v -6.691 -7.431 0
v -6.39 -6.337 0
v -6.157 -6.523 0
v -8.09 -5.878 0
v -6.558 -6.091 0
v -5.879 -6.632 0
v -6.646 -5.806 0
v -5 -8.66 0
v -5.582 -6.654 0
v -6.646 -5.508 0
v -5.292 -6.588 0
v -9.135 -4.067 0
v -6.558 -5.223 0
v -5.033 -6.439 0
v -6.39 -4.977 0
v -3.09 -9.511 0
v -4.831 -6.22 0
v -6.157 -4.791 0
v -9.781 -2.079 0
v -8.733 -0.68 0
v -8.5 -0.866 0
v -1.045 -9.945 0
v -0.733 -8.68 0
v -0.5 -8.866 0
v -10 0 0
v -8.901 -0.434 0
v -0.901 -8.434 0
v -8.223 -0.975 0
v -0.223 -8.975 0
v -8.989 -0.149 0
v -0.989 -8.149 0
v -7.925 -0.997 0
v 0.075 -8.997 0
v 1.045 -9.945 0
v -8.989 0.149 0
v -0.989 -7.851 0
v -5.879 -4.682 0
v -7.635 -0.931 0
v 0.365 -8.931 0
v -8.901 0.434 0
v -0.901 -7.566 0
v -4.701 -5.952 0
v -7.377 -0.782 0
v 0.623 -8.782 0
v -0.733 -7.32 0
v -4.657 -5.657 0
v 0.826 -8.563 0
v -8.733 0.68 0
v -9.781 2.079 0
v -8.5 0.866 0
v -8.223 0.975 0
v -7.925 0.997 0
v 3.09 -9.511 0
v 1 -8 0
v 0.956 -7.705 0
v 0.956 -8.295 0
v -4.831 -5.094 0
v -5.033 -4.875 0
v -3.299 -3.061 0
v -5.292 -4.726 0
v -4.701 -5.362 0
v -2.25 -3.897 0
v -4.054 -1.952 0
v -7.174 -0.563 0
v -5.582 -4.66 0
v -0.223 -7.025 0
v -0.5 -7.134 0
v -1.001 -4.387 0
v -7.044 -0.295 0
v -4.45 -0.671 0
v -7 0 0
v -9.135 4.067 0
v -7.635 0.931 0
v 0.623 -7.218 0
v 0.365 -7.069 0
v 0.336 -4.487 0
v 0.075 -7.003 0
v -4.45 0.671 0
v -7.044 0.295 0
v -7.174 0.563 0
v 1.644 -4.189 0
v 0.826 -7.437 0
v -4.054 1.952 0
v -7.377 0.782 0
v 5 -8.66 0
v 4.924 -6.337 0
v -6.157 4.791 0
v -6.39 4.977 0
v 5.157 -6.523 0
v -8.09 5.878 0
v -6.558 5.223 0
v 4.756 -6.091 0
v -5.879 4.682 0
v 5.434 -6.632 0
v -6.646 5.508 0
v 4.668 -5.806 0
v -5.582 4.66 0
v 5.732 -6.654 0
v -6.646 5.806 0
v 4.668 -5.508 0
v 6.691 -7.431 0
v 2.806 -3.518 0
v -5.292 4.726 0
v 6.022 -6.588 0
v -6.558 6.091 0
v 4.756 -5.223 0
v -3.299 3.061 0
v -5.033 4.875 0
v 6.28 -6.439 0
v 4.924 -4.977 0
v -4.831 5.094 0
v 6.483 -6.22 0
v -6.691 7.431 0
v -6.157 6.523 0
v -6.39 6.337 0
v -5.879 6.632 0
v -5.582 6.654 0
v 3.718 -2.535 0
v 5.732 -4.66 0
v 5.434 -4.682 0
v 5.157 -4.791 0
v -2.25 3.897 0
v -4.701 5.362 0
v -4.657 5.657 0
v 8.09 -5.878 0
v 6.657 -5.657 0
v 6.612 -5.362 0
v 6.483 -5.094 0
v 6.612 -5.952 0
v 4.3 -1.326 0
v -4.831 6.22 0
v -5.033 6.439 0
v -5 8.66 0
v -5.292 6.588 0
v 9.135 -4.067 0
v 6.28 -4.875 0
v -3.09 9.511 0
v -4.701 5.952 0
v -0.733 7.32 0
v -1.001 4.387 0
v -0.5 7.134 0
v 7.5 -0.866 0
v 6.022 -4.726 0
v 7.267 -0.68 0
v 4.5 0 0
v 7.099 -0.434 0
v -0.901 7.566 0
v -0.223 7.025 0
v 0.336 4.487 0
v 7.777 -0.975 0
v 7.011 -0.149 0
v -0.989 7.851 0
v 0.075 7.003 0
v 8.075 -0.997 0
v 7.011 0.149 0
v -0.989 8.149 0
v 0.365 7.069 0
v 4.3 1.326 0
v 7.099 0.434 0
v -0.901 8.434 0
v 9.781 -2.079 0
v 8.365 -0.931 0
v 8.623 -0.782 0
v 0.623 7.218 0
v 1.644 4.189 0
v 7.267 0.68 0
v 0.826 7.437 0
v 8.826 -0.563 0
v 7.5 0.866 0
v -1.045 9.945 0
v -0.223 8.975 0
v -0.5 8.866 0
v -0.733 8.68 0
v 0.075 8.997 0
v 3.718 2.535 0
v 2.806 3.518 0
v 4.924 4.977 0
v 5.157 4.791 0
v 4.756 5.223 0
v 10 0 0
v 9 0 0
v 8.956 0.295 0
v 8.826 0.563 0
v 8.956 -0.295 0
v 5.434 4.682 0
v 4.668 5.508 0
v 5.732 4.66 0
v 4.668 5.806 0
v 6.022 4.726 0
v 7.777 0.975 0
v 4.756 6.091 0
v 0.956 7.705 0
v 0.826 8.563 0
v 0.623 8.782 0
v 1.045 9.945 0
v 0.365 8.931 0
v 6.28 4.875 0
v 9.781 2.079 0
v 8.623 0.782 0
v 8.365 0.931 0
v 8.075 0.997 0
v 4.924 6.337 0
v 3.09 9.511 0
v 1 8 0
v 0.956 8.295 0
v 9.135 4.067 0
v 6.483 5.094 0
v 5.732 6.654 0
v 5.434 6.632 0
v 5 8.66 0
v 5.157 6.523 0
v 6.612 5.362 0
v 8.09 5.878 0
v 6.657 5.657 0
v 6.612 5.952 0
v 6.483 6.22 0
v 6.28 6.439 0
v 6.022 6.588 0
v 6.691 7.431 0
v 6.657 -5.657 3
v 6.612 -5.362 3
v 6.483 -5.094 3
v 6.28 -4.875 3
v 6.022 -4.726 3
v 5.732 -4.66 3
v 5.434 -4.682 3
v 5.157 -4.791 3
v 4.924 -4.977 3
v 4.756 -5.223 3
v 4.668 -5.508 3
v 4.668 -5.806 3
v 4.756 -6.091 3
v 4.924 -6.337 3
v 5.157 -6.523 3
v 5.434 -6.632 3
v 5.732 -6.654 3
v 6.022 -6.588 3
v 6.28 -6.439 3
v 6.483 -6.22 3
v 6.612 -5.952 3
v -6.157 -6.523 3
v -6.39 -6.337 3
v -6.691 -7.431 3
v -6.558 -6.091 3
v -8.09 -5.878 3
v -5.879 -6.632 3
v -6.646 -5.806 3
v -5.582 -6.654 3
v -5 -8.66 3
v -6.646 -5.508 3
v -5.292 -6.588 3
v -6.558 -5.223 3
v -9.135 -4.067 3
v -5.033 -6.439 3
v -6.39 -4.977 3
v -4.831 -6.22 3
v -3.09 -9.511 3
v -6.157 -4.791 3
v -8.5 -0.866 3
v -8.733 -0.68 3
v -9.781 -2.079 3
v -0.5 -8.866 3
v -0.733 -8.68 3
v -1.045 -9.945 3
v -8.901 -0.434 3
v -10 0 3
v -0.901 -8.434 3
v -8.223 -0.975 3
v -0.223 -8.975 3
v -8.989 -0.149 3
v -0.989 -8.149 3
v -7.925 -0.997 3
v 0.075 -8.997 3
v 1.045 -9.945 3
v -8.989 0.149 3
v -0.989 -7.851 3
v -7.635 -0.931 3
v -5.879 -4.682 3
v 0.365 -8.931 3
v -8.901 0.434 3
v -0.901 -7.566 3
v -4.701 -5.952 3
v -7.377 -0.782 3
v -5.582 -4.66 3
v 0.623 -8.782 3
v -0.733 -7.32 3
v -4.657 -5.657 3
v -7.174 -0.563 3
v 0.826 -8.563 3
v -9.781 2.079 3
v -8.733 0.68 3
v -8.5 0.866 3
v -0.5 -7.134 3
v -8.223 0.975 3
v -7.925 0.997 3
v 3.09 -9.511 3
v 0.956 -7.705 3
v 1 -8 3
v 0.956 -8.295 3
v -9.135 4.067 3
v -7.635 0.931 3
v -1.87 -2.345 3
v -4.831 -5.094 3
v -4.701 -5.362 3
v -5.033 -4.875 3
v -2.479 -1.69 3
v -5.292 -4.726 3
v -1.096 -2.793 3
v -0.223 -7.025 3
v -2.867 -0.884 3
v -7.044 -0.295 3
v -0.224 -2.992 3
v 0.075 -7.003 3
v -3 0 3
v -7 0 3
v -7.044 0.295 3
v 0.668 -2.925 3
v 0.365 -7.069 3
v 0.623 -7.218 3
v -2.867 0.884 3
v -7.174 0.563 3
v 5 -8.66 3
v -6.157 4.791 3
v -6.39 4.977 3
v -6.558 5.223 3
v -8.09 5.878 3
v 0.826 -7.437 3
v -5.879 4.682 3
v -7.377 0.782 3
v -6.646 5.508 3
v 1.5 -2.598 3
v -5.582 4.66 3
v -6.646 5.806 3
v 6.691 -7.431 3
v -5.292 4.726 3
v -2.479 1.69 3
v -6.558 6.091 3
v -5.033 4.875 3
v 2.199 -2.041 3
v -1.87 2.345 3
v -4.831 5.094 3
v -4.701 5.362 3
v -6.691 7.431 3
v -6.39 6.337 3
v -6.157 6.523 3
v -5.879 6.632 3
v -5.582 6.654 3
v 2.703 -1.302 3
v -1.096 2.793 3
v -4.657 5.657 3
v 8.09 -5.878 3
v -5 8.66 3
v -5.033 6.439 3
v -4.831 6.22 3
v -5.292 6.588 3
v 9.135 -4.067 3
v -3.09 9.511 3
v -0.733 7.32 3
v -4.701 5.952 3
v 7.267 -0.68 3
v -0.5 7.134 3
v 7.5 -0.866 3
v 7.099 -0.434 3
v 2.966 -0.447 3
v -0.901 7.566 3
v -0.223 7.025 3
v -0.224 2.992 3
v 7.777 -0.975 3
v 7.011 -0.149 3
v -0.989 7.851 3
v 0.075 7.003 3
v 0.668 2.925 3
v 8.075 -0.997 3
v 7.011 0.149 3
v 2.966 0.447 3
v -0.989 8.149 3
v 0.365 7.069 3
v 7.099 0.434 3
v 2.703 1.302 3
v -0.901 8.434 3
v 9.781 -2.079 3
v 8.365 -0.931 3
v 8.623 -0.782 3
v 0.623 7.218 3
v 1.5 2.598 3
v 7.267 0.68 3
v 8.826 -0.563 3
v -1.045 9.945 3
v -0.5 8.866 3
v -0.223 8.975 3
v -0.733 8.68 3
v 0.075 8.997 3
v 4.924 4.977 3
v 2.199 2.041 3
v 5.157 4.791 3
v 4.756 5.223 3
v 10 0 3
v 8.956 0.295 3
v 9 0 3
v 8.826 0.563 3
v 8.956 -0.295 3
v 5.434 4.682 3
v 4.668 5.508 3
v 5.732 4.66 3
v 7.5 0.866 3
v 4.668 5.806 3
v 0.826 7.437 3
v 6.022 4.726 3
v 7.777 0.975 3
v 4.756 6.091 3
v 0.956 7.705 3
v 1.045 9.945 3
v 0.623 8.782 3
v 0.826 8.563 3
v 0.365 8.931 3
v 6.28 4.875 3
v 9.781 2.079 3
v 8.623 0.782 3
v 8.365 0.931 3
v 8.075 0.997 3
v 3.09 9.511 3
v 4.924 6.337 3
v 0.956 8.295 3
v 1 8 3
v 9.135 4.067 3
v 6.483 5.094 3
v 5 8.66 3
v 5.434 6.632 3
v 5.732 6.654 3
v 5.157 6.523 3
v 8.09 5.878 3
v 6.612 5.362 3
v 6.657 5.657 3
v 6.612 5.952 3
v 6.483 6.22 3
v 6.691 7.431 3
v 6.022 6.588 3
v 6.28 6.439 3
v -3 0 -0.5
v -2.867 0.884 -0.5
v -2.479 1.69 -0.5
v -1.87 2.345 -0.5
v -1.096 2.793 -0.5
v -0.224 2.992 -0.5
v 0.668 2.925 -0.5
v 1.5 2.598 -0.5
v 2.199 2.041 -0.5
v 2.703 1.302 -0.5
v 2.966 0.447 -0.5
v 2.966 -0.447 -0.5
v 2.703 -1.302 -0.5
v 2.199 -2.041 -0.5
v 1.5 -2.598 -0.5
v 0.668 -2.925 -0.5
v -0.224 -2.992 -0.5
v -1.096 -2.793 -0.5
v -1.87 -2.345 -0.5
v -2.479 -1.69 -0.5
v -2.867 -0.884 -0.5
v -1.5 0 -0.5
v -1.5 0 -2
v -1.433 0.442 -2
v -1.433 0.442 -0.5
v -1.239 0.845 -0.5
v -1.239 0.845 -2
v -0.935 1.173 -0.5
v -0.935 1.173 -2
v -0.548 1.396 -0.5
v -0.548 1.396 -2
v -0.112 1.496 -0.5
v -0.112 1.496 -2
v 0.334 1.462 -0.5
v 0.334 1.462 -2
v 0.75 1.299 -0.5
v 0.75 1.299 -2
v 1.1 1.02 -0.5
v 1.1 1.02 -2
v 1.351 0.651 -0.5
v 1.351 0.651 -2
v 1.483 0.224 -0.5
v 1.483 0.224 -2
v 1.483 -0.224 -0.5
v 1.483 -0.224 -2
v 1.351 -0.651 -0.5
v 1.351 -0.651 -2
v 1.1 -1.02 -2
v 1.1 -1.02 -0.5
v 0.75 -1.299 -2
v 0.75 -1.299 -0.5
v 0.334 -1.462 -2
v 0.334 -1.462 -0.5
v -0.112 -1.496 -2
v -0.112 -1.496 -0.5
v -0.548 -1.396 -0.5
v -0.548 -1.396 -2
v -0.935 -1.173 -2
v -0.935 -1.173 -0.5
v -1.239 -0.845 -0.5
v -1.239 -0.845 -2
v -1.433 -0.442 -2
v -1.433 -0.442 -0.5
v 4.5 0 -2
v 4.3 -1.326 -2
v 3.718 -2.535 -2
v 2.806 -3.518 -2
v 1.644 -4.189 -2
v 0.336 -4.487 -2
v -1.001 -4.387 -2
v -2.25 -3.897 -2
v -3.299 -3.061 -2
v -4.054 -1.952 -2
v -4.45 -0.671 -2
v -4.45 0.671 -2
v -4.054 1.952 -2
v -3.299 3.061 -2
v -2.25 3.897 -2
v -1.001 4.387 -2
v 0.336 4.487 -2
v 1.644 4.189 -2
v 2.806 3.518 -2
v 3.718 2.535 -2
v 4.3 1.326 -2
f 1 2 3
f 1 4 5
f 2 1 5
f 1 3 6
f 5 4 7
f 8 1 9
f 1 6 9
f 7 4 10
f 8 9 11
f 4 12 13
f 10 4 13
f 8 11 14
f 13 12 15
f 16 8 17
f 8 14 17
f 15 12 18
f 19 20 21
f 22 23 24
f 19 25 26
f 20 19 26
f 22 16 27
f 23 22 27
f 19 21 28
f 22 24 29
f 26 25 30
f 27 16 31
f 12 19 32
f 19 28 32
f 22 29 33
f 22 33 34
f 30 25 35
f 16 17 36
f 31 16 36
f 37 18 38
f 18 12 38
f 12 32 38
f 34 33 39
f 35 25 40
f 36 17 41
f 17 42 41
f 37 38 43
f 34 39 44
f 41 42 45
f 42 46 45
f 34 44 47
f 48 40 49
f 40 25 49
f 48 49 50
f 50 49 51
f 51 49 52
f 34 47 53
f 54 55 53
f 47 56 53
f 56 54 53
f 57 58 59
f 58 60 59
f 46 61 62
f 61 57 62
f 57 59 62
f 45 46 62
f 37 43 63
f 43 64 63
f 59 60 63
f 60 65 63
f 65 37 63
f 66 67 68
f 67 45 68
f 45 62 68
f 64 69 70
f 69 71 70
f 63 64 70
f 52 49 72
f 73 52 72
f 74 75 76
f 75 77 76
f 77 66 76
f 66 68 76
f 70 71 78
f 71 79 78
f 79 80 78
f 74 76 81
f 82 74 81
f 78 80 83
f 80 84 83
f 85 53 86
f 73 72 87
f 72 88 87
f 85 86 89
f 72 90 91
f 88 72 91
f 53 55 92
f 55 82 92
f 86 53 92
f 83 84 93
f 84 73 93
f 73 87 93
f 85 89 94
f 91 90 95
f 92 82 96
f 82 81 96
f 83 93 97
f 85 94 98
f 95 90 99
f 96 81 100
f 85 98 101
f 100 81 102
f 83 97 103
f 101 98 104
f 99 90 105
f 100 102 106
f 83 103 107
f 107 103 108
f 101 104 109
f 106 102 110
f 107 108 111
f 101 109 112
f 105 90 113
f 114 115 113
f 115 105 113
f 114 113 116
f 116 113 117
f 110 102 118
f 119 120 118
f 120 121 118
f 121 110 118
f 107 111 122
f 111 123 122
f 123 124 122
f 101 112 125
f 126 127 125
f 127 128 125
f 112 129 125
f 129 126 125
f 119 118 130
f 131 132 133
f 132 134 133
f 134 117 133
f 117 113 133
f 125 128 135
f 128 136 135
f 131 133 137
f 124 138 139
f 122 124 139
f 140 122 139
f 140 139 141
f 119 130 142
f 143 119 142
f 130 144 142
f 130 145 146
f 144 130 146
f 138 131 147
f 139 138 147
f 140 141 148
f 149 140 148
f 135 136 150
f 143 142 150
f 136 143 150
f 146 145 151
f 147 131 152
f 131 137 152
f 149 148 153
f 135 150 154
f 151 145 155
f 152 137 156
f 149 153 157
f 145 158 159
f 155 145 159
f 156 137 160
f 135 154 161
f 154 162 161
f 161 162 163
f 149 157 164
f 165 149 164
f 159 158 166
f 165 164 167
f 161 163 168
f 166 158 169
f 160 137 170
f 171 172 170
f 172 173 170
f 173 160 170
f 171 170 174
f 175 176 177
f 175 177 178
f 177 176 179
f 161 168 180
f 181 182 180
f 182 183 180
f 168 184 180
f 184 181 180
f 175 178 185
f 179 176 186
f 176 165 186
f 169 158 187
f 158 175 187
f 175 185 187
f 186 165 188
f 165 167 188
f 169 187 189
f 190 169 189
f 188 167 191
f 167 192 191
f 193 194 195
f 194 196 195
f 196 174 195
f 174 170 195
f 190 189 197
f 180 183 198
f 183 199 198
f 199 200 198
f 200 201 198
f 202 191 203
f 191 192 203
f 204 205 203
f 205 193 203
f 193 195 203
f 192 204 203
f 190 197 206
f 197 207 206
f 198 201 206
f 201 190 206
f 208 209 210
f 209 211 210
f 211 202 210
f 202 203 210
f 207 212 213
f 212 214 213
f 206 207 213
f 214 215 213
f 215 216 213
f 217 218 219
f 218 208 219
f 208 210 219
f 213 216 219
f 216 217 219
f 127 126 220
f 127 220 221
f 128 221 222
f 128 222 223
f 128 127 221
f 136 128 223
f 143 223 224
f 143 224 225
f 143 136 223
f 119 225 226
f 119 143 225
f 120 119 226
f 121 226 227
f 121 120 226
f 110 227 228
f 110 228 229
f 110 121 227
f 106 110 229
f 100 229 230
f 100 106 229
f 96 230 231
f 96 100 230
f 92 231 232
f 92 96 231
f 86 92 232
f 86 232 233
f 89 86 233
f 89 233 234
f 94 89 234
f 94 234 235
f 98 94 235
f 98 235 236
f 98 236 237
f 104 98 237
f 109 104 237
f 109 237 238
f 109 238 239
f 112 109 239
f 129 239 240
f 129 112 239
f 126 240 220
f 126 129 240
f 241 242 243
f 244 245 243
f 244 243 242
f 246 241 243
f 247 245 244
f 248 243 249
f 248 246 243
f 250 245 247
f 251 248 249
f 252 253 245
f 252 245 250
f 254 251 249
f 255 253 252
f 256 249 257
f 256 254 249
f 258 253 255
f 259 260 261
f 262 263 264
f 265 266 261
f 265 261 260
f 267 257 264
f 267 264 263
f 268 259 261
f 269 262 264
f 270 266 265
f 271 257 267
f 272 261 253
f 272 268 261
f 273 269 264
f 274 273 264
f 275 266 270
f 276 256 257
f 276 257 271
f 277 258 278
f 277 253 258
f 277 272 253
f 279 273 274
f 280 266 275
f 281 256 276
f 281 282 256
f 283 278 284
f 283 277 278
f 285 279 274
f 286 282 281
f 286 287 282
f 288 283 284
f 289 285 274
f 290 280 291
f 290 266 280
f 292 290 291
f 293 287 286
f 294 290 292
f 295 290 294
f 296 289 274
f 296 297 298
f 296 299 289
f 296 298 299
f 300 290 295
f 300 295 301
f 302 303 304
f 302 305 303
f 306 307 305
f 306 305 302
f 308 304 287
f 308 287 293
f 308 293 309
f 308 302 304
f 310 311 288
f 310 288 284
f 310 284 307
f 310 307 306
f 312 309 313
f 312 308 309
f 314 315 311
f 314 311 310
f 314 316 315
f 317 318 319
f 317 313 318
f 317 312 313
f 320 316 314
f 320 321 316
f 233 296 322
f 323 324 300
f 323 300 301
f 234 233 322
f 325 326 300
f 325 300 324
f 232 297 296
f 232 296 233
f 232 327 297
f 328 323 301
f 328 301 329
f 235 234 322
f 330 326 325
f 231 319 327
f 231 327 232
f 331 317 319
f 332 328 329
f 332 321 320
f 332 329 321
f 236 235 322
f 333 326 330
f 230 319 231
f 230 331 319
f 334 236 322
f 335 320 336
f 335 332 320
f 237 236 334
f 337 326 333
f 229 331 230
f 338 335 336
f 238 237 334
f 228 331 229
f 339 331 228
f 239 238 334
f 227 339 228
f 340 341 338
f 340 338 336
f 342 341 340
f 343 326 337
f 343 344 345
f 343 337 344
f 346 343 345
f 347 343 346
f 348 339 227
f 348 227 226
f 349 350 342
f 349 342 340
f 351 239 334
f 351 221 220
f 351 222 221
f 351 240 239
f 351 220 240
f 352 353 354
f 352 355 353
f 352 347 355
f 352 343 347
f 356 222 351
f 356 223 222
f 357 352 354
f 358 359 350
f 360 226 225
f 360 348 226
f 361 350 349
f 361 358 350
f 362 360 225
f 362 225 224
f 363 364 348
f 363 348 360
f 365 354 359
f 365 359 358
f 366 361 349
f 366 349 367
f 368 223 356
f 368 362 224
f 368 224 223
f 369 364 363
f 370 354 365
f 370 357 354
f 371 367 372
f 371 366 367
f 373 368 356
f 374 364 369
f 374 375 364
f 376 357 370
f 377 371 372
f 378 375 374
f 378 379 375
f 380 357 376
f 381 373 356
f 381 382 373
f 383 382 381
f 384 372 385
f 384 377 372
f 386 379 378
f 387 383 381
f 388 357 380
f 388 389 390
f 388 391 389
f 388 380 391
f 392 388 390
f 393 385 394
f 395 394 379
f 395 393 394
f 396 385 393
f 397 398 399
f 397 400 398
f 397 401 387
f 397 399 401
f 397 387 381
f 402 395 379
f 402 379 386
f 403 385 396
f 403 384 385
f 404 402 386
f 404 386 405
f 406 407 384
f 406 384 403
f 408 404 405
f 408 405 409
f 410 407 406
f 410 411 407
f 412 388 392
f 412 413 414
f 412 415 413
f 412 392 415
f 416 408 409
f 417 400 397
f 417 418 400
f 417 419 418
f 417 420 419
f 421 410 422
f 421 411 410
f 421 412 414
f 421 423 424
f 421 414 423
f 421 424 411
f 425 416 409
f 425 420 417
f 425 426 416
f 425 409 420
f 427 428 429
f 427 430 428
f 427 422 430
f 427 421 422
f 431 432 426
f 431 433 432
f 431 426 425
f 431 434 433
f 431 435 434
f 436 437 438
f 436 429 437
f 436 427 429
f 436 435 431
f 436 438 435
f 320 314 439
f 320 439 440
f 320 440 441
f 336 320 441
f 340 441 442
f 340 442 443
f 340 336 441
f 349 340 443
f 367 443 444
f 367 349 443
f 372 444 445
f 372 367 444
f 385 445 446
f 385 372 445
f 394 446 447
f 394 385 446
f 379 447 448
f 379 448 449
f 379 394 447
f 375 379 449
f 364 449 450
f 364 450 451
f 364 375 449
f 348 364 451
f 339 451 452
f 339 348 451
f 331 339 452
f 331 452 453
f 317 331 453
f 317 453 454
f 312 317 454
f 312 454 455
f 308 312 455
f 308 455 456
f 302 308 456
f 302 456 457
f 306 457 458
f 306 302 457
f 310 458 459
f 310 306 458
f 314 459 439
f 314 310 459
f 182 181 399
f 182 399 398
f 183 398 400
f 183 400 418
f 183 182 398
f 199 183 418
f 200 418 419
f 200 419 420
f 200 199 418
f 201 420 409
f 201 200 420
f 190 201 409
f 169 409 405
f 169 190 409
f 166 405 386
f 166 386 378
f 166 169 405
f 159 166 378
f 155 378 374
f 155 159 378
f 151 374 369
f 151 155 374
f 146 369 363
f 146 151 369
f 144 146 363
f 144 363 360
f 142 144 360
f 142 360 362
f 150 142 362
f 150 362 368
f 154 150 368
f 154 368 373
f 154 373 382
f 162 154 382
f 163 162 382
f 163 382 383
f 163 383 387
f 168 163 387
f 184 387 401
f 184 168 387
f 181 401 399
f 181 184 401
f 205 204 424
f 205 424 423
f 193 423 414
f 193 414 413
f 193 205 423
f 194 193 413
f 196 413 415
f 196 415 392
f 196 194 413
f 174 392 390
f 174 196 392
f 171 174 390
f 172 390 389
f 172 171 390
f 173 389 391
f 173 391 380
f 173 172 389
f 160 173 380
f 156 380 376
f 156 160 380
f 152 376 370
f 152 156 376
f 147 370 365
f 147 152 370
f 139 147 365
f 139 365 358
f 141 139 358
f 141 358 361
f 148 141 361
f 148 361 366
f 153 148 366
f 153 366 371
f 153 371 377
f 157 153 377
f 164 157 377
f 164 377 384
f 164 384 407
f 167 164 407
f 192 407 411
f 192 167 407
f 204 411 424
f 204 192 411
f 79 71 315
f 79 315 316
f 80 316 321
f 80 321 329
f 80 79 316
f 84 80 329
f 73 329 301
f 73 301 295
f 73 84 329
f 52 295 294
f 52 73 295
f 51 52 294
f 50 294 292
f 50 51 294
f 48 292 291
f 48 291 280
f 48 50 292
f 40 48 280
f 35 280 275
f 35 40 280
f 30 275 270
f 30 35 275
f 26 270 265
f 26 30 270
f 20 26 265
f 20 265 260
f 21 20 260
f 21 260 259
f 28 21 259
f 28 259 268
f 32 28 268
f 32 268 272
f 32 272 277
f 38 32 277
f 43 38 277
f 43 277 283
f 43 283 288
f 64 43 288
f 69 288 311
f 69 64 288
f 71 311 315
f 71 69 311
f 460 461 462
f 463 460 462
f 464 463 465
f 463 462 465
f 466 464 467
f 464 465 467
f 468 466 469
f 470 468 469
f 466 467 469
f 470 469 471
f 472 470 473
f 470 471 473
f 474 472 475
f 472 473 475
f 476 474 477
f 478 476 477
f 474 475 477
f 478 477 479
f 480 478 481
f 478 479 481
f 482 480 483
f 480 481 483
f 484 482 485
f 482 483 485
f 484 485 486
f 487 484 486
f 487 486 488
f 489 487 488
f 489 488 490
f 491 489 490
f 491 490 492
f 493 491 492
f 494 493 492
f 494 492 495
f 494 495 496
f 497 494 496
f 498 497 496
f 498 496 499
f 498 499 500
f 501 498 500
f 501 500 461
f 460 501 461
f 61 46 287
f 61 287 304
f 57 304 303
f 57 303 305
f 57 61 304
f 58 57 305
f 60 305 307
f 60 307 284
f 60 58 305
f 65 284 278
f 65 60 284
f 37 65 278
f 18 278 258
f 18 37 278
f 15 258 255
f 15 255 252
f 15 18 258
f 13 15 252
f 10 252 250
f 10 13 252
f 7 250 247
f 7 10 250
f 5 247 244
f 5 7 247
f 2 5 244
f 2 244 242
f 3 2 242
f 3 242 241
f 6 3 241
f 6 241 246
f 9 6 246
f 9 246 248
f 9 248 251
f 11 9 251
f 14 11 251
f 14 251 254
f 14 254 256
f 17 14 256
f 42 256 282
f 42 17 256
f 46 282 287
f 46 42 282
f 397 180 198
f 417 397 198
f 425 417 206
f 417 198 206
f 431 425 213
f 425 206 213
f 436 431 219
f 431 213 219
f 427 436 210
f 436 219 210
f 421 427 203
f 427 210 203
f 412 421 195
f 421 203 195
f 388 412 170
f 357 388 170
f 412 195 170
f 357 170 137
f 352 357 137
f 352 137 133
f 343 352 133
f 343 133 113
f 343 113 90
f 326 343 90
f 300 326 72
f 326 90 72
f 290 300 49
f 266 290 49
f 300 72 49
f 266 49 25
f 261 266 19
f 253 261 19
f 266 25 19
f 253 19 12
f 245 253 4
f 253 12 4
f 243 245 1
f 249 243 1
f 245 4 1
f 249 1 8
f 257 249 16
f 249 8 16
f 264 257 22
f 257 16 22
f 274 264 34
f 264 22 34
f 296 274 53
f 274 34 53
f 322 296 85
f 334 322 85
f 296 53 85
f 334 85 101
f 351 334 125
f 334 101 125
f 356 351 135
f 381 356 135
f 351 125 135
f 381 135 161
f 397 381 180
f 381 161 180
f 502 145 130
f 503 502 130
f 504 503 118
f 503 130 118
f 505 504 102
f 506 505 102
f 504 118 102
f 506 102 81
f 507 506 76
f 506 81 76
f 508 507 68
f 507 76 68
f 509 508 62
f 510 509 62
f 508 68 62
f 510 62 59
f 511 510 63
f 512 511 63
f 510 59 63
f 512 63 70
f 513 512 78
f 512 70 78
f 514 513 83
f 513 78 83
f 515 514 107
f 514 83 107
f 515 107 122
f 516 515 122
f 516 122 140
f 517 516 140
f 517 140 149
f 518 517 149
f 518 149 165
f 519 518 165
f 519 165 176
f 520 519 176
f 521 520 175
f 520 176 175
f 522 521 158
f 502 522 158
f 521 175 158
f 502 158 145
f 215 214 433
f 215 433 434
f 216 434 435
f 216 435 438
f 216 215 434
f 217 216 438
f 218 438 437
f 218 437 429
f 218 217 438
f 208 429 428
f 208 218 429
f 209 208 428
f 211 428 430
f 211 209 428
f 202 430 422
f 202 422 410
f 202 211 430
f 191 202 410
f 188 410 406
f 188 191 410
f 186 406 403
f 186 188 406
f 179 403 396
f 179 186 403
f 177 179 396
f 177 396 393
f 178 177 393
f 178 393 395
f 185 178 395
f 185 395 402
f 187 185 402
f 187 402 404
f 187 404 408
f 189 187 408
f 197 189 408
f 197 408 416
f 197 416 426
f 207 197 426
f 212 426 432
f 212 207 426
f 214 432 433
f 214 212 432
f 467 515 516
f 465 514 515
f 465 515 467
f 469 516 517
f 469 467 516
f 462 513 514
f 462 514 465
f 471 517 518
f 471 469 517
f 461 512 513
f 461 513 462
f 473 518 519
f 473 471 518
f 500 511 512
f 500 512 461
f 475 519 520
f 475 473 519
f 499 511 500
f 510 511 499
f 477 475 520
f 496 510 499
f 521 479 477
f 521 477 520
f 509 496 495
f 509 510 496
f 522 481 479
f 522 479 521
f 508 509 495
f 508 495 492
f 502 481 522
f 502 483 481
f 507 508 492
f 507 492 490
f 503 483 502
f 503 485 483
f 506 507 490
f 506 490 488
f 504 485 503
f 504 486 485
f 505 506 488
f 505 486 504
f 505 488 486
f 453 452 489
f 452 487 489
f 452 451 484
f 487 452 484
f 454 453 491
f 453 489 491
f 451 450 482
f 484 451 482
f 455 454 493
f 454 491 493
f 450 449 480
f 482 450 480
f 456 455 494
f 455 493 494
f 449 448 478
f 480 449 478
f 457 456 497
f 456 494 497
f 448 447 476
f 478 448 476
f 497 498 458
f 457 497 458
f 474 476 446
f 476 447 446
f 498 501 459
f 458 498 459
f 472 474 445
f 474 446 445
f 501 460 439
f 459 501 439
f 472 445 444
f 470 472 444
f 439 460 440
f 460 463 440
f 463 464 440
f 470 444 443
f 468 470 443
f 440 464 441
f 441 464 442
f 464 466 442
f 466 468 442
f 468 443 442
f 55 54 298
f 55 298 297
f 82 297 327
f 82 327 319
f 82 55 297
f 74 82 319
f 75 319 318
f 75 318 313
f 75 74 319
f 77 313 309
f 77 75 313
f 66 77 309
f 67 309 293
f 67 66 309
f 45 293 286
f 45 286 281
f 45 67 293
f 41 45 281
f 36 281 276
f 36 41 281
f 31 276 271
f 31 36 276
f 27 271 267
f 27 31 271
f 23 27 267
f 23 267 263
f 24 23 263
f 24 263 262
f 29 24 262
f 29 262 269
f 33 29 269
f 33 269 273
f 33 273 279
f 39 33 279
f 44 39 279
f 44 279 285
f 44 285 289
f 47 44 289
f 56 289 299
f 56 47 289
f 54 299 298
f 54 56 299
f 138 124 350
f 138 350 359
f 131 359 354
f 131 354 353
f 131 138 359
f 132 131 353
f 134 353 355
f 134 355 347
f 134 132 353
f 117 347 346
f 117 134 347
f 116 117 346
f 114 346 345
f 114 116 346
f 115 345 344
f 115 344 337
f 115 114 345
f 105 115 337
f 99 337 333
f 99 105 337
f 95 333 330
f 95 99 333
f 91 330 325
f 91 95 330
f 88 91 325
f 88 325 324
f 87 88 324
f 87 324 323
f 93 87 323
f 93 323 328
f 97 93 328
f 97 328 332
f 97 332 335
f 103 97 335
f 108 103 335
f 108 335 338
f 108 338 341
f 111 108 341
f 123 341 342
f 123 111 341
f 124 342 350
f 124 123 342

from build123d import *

# Parameters (mm, degrees)
SKETCH_1_R          = 10
SKETCH_1_R_2        = 1.5
SKETCH_1_R_3        = 1
EXTRUDE_1_DEPTH     = 3
SKETCH_2_R          = 4.5
EXTRUDE_2_DEPTH     = 2
SKETCH_3_R          = 3
CUT_EXTRUDE_1_DEPTH = 3.5
SKETCH_4_R          = 1.5
CUT_EXTRUDE_2_DEPTH = 10


with BuildPart() as part:
    # 草图1 → 凸台-拉伸1 (new body)
    with BuildSketch(Plane.XY):
        Circle(SKETCH_1_R)
        Circle(SKETCH_1_R_2, mode=Mode.SUBTRACT)
        with Locations((0, 8)):
            Circle(SKETCH_1_R_3, mode=Mode.SUBTRACT)
        with Locations((5.656854249, 5.656854249)):
            Circle(SKETCH_1_R_3, mode=Mode.SUBTRACT)
        with Locations((8, 0)):
            Circle(SKETCH_1_R_3, mode=Mode.SUBTRACT)
        with Locations((5.656854249, -5.656854249)):
            Circle(SKETCH_1_R_3, mode=Mode.SUBTRACT)
        with Locations((0, -8)):
            Circle(SKETCH_1_R_3, mode=Mode.SUBTRACT)
        with Locations((-5.656854249, -5.656854249)):
            Circle(SKETCH_1_R_3, mode=Mode.SUBTRACT)
        with Locations((-8, 0)):
            Circle(SKETCH_1_R_3, mode=Mode.SUBTRACT)
        with Locations((-5.656854249, 5.656854249)):
            Circle(SKETCH_1_R_3, mode=Mode.SUBTRACT)
    extrude(amount=EXTRUDE_1_DEPTH)

    # 草图2 → 凸台-拉伸2 (add)
    with BuildSketch(Plane(origin=(0, 0, 0), x_dir=(-1, 0, 0), z_dir=(0, 0, -1))):
        with Locations(Location((0, 0, 0), (0, 0, 180))):
            Circle(SKETCH_2_R)
    extrude(amount=EXTRUDE_2_DEPTH)

    # 草图3 → 切除-拉伸1 (cut)
    with BuildSketch(Plane(origin=(0, 0, 3), x_dir=(-1, 0, 0), z_dir=(0, 0, -1))):
        Circle(SKETCH_3_R)
    extrude(amount=CUT_EXTRUDE_1_DEPTH, mode=Mode.SUBTRACT)

    # 草图4 → 切除-拉伸2 (cut)
    with BuildSketch(Plane(origin=(0, 0, -2), x_dir=(-1, 0, 0), z_dir=(0, 0, -1))):
        Circle(SKETCH_4_R)
    extrude(amount=-CUT_EXTRUDE_2_DEPTH, mode=Mode.SUBTRACT)


solid = part.part
